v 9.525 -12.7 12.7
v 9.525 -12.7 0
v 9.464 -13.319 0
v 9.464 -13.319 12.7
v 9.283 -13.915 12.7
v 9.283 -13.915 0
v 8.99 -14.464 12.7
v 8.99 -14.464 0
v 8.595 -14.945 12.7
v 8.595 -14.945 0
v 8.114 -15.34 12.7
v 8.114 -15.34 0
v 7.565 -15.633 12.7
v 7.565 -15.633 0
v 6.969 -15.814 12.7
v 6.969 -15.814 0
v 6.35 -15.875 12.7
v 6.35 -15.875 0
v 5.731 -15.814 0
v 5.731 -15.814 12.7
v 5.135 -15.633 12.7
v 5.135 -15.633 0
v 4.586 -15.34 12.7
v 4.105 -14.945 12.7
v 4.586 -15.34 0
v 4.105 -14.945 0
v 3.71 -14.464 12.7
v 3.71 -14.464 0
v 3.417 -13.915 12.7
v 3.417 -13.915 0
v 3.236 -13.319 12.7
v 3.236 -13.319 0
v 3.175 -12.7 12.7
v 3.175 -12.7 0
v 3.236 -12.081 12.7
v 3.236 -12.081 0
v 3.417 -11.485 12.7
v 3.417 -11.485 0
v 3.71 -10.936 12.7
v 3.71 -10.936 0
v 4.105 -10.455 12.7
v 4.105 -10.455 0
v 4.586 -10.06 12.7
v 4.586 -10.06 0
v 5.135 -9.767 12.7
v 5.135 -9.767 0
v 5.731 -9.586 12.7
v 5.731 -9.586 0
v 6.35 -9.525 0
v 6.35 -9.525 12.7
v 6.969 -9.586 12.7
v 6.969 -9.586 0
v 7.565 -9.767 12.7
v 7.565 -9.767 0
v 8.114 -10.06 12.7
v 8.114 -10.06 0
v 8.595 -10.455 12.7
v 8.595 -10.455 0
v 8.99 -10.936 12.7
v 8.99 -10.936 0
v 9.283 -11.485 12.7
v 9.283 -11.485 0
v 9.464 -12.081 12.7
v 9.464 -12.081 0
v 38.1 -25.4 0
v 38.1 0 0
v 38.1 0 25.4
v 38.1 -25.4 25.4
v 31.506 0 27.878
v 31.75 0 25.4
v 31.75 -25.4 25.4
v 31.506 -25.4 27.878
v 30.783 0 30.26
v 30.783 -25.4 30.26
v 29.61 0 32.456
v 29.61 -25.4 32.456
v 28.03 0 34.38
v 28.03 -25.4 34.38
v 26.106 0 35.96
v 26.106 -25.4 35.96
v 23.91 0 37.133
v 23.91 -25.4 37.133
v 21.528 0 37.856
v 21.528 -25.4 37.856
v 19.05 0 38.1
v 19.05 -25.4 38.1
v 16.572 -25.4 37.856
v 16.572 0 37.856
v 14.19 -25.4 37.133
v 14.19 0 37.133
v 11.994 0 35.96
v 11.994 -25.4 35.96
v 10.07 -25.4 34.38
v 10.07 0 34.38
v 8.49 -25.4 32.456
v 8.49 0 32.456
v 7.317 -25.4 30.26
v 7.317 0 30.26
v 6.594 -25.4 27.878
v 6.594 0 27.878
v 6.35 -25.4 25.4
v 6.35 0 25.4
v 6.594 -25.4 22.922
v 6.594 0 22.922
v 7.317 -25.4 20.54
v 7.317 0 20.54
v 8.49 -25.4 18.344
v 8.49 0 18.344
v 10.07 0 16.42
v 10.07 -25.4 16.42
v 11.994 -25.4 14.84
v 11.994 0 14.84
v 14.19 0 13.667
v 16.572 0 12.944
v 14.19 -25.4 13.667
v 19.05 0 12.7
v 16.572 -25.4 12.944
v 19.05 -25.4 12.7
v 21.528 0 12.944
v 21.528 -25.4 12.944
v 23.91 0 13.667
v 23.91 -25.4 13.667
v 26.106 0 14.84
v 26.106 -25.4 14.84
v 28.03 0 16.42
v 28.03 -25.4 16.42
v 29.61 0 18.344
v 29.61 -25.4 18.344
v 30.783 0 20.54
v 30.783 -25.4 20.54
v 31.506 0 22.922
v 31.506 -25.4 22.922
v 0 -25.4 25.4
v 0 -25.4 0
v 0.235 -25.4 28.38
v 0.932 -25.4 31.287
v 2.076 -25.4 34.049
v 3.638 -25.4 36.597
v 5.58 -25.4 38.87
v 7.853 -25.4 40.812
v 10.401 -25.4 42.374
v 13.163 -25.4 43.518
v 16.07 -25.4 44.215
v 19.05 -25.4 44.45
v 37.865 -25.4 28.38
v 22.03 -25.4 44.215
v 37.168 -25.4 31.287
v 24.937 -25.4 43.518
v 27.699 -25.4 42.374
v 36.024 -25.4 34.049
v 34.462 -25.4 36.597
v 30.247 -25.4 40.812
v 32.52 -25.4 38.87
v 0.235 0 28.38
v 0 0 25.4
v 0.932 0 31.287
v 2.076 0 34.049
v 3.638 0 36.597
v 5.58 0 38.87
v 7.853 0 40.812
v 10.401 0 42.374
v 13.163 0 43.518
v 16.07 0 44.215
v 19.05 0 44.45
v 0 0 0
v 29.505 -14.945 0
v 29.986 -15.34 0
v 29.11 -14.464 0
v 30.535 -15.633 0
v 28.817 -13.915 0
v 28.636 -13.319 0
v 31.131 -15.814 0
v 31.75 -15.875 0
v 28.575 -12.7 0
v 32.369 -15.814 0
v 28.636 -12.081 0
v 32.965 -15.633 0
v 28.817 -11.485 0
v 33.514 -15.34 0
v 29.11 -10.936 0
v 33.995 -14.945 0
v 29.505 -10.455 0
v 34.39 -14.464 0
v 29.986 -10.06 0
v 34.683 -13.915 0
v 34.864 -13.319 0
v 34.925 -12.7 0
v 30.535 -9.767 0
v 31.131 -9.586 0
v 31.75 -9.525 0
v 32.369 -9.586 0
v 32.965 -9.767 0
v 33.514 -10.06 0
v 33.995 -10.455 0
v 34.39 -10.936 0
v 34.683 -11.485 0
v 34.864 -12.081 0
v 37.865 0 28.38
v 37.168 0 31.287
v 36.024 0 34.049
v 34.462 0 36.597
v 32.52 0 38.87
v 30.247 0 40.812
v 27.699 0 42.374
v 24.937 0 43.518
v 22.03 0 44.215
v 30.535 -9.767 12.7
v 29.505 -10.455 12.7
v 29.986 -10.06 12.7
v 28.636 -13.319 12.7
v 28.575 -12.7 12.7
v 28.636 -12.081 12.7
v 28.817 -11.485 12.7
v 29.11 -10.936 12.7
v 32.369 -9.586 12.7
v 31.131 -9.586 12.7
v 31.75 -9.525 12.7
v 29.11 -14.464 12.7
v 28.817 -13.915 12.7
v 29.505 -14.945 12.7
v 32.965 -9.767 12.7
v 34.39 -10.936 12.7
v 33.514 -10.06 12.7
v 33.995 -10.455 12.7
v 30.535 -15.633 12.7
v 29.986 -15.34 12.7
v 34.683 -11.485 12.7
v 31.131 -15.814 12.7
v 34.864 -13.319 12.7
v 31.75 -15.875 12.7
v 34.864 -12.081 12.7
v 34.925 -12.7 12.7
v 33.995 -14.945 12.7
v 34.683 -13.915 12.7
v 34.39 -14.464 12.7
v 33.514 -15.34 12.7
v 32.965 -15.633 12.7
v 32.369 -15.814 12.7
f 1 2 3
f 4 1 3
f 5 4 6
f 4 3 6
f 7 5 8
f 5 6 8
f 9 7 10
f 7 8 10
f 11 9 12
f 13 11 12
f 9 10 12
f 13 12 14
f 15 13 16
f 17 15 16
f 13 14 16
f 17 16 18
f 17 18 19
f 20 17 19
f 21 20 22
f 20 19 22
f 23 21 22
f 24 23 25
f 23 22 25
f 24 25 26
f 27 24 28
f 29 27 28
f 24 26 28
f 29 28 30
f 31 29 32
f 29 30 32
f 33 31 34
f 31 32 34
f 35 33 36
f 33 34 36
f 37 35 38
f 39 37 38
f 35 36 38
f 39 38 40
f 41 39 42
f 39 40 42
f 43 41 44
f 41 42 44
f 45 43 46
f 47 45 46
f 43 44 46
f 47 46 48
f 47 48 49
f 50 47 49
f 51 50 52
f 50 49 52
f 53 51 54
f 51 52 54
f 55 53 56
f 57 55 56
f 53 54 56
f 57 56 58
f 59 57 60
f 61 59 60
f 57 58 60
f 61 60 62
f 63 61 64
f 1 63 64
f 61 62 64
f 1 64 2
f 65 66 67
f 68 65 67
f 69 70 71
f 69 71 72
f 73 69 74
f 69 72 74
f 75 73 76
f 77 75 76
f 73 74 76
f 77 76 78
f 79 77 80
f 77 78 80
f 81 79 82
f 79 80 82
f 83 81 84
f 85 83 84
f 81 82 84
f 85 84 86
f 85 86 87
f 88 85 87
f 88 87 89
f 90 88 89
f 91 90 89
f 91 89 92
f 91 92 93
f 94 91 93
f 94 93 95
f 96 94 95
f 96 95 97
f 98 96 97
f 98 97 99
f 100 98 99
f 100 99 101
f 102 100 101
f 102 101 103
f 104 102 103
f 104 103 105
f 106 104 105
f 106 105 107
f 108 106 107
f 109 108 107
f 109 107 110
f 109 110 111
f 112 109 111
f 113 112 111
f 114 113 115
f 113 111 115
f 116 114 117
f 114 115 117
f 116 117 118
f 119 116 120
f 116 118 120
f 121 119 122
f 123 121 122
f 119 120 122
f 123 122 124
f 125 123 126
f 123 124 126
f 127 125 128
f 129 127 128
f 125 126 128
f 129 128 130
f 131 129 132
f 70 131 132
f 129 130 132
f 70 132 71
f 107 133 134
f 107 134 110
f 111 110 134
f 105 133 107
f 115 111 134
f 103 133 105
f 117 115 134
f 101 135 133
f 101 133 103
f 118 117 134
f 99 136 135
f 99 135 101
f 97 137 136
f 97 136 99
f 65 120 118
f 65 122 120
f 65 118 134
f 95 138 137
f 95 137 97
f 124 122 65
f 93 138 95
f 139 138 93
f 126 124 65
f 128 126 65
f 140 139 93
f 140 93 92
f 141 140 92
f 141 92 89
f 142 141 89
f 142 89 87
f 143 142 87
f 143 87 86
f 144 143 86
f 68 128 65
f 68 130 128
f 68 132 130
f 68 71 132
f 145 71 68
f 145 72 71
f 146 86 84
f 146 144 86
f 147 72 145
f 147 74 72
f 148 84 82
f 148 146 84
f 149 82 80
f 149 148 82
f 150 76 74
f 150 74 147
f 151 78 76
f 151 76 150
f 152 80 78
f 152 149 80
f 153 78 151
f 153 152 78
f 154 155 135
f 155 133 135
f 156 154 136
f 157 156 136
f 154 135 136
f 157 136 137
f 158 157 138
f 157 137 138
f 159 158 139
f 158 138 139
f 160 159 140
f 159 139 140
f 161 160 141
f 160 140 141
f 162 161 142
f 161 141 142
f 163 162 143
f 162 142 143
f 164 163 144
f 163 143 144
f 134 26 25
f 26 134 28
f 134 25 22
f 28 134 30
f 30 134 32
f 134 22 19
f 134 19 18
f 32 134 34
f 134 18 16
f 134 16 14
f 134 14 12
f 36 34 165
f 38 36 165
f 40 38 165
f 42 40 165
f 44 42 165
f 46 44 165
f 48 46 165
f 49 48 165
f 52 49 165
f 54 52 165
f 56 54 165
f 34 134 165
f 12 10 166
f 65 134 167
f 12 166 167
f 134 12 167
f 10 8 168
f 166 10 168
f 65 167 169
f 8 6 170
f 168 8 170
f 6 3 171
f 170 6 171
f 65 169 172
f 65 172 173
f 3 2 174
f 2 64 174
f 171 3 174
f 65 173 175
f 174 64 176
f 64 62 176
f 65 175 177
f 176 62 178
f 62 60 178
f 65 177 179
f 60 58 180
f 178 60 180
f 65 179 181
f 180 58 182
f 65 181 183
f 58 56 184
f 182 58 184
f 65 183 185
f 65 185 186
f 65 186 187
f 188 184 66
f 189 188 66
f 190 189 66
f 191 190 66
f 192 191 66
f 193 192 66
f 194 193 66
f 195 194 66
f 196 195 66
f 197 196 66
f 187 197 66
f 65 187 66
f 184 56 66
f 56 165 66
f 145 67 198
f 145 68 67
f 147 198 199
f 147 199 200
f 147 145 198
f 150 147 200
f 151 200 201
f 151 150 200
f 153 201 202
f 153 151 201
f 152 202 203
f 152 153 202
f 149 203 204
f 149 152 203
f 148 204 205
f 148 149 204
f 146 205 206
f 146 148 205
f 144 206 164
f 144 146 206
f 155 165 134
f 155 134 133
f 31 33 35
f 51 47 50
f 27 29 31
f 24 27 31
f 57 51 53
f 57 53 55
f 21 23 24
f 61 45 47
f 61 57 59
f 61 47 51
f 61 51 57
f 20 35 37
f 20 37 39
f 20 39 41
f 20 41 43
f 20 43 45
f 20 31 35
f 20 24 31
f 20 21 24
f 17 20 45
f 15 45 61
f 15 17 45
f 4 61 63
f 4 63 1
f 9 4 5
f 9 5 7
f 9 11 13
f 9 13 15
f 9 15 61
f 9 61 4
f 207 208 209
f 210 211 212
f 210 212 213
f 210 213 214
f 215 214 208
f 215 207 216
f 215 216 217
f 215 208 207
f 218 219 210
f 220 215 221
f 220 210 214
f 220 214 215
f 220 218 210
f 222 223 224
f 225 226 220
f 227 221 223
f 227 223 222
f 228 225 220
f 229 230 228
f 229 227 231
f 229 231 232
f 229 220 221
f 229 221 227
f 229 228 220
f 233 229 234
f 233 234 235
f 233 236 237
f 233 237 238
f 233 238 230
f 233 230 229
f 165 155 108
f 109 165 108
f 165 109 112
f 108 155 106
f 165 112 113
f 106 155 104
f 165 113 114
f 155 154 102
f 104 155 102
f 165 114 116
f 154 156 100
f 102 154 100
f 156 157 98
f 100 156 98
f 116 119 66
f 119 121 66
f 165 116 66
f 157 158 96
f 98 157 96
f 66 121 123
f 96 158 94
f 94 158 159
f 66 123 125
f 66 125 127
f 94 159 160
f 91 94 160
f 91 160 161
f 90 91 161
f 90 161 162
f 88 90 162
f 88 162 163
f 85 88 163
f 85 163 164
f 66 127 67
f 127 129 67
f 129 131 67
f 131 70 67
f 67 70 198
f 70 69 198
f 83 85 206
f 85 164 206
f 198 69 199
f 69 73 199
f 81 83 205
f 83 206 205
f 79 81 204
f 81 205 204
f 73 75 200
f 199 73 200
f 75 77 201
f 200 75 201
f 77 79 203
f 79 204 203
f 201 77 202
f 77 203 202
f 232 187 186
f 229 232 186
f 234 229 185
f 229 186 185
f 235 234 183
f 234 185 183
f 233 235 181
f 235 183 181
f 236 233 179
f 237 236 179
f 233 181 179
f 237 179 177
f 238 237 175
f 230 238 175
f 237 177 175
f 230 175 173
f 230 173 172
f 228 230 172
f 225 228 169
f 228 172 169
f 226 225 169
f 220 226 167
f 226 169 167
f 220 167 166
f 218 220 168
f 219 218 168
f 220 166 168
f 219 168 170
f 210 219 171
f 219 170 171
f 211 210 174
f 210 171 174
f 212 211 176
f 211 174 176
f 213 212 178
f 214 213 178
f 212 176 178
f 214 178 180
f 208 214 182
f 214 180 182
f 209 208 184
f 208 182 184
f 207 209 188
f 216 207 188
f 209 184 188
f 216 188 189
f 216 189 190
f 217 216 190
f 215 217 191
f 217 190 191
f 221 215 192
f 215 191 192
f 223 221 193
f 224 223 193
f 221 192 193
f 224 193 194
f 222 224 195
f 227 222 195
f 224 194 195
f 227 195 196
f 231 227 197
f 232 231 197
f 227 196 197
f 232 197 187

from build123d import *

# Parameters (mm, degrees)
F0_W     = 38.1
F0_H     = 44.45
F1_DEPTH = 25.4
F2_R     = 19.04999
F3_R     = 12.7
F4_DEPTH = 25.401
F5_R     = 3.175
F6_DEPTH = 12.7


# Not quite as in the source:
# - a fillet or chamfer is up to 0.001 mm smaller than in the source, because OpenCascade refuses the exact size


with BuildPart() as f1:
    # F0 (on Front) → F1 (new body)
    with BuildSketch(Plane.XZ):
        with Locations((19.05, 22.225)):
            Rectangle(F0_W, F0_H)
    extrude(amount=F1_DEPTH)

    # F2 (radius 19.05 in the source; OpenCascade refuses exactly that, so slightly less here)
    f2_edges = [f1.edges().sort_by_distance(p)[0] for p in [
        (0, -12.7, 44.45),
        (38.1, -12.7, 44.45),
    ]]
    fillet(f2_edges, radius=F2_R)

    # F3 (on face) → F4 (cut, through all)
    with BuildSketch(Plane.XZ.offset(25.4)):
        with Locations((19.05, 25.4)):
            Circle(F3_R)
    extrude(amount=-F4_DEPTH, mode=Mode.SUBTRACT)

    # F5 (on face) → F6 (cut)
    with BuildSketch(Plane(origin=(0, 0, 0), x_dir=(1, 0, 0), z_dir=(0, 0, -1))):
        with Locations((6.35, 12.7)):
            Circle(F5_R)
        with Locations((31.75, 12.7)):
            Circle(F5_R)
    extrude(amount=-F6_DEPTH, mode=Mode.SUBTRACT)


solid = f1.part
